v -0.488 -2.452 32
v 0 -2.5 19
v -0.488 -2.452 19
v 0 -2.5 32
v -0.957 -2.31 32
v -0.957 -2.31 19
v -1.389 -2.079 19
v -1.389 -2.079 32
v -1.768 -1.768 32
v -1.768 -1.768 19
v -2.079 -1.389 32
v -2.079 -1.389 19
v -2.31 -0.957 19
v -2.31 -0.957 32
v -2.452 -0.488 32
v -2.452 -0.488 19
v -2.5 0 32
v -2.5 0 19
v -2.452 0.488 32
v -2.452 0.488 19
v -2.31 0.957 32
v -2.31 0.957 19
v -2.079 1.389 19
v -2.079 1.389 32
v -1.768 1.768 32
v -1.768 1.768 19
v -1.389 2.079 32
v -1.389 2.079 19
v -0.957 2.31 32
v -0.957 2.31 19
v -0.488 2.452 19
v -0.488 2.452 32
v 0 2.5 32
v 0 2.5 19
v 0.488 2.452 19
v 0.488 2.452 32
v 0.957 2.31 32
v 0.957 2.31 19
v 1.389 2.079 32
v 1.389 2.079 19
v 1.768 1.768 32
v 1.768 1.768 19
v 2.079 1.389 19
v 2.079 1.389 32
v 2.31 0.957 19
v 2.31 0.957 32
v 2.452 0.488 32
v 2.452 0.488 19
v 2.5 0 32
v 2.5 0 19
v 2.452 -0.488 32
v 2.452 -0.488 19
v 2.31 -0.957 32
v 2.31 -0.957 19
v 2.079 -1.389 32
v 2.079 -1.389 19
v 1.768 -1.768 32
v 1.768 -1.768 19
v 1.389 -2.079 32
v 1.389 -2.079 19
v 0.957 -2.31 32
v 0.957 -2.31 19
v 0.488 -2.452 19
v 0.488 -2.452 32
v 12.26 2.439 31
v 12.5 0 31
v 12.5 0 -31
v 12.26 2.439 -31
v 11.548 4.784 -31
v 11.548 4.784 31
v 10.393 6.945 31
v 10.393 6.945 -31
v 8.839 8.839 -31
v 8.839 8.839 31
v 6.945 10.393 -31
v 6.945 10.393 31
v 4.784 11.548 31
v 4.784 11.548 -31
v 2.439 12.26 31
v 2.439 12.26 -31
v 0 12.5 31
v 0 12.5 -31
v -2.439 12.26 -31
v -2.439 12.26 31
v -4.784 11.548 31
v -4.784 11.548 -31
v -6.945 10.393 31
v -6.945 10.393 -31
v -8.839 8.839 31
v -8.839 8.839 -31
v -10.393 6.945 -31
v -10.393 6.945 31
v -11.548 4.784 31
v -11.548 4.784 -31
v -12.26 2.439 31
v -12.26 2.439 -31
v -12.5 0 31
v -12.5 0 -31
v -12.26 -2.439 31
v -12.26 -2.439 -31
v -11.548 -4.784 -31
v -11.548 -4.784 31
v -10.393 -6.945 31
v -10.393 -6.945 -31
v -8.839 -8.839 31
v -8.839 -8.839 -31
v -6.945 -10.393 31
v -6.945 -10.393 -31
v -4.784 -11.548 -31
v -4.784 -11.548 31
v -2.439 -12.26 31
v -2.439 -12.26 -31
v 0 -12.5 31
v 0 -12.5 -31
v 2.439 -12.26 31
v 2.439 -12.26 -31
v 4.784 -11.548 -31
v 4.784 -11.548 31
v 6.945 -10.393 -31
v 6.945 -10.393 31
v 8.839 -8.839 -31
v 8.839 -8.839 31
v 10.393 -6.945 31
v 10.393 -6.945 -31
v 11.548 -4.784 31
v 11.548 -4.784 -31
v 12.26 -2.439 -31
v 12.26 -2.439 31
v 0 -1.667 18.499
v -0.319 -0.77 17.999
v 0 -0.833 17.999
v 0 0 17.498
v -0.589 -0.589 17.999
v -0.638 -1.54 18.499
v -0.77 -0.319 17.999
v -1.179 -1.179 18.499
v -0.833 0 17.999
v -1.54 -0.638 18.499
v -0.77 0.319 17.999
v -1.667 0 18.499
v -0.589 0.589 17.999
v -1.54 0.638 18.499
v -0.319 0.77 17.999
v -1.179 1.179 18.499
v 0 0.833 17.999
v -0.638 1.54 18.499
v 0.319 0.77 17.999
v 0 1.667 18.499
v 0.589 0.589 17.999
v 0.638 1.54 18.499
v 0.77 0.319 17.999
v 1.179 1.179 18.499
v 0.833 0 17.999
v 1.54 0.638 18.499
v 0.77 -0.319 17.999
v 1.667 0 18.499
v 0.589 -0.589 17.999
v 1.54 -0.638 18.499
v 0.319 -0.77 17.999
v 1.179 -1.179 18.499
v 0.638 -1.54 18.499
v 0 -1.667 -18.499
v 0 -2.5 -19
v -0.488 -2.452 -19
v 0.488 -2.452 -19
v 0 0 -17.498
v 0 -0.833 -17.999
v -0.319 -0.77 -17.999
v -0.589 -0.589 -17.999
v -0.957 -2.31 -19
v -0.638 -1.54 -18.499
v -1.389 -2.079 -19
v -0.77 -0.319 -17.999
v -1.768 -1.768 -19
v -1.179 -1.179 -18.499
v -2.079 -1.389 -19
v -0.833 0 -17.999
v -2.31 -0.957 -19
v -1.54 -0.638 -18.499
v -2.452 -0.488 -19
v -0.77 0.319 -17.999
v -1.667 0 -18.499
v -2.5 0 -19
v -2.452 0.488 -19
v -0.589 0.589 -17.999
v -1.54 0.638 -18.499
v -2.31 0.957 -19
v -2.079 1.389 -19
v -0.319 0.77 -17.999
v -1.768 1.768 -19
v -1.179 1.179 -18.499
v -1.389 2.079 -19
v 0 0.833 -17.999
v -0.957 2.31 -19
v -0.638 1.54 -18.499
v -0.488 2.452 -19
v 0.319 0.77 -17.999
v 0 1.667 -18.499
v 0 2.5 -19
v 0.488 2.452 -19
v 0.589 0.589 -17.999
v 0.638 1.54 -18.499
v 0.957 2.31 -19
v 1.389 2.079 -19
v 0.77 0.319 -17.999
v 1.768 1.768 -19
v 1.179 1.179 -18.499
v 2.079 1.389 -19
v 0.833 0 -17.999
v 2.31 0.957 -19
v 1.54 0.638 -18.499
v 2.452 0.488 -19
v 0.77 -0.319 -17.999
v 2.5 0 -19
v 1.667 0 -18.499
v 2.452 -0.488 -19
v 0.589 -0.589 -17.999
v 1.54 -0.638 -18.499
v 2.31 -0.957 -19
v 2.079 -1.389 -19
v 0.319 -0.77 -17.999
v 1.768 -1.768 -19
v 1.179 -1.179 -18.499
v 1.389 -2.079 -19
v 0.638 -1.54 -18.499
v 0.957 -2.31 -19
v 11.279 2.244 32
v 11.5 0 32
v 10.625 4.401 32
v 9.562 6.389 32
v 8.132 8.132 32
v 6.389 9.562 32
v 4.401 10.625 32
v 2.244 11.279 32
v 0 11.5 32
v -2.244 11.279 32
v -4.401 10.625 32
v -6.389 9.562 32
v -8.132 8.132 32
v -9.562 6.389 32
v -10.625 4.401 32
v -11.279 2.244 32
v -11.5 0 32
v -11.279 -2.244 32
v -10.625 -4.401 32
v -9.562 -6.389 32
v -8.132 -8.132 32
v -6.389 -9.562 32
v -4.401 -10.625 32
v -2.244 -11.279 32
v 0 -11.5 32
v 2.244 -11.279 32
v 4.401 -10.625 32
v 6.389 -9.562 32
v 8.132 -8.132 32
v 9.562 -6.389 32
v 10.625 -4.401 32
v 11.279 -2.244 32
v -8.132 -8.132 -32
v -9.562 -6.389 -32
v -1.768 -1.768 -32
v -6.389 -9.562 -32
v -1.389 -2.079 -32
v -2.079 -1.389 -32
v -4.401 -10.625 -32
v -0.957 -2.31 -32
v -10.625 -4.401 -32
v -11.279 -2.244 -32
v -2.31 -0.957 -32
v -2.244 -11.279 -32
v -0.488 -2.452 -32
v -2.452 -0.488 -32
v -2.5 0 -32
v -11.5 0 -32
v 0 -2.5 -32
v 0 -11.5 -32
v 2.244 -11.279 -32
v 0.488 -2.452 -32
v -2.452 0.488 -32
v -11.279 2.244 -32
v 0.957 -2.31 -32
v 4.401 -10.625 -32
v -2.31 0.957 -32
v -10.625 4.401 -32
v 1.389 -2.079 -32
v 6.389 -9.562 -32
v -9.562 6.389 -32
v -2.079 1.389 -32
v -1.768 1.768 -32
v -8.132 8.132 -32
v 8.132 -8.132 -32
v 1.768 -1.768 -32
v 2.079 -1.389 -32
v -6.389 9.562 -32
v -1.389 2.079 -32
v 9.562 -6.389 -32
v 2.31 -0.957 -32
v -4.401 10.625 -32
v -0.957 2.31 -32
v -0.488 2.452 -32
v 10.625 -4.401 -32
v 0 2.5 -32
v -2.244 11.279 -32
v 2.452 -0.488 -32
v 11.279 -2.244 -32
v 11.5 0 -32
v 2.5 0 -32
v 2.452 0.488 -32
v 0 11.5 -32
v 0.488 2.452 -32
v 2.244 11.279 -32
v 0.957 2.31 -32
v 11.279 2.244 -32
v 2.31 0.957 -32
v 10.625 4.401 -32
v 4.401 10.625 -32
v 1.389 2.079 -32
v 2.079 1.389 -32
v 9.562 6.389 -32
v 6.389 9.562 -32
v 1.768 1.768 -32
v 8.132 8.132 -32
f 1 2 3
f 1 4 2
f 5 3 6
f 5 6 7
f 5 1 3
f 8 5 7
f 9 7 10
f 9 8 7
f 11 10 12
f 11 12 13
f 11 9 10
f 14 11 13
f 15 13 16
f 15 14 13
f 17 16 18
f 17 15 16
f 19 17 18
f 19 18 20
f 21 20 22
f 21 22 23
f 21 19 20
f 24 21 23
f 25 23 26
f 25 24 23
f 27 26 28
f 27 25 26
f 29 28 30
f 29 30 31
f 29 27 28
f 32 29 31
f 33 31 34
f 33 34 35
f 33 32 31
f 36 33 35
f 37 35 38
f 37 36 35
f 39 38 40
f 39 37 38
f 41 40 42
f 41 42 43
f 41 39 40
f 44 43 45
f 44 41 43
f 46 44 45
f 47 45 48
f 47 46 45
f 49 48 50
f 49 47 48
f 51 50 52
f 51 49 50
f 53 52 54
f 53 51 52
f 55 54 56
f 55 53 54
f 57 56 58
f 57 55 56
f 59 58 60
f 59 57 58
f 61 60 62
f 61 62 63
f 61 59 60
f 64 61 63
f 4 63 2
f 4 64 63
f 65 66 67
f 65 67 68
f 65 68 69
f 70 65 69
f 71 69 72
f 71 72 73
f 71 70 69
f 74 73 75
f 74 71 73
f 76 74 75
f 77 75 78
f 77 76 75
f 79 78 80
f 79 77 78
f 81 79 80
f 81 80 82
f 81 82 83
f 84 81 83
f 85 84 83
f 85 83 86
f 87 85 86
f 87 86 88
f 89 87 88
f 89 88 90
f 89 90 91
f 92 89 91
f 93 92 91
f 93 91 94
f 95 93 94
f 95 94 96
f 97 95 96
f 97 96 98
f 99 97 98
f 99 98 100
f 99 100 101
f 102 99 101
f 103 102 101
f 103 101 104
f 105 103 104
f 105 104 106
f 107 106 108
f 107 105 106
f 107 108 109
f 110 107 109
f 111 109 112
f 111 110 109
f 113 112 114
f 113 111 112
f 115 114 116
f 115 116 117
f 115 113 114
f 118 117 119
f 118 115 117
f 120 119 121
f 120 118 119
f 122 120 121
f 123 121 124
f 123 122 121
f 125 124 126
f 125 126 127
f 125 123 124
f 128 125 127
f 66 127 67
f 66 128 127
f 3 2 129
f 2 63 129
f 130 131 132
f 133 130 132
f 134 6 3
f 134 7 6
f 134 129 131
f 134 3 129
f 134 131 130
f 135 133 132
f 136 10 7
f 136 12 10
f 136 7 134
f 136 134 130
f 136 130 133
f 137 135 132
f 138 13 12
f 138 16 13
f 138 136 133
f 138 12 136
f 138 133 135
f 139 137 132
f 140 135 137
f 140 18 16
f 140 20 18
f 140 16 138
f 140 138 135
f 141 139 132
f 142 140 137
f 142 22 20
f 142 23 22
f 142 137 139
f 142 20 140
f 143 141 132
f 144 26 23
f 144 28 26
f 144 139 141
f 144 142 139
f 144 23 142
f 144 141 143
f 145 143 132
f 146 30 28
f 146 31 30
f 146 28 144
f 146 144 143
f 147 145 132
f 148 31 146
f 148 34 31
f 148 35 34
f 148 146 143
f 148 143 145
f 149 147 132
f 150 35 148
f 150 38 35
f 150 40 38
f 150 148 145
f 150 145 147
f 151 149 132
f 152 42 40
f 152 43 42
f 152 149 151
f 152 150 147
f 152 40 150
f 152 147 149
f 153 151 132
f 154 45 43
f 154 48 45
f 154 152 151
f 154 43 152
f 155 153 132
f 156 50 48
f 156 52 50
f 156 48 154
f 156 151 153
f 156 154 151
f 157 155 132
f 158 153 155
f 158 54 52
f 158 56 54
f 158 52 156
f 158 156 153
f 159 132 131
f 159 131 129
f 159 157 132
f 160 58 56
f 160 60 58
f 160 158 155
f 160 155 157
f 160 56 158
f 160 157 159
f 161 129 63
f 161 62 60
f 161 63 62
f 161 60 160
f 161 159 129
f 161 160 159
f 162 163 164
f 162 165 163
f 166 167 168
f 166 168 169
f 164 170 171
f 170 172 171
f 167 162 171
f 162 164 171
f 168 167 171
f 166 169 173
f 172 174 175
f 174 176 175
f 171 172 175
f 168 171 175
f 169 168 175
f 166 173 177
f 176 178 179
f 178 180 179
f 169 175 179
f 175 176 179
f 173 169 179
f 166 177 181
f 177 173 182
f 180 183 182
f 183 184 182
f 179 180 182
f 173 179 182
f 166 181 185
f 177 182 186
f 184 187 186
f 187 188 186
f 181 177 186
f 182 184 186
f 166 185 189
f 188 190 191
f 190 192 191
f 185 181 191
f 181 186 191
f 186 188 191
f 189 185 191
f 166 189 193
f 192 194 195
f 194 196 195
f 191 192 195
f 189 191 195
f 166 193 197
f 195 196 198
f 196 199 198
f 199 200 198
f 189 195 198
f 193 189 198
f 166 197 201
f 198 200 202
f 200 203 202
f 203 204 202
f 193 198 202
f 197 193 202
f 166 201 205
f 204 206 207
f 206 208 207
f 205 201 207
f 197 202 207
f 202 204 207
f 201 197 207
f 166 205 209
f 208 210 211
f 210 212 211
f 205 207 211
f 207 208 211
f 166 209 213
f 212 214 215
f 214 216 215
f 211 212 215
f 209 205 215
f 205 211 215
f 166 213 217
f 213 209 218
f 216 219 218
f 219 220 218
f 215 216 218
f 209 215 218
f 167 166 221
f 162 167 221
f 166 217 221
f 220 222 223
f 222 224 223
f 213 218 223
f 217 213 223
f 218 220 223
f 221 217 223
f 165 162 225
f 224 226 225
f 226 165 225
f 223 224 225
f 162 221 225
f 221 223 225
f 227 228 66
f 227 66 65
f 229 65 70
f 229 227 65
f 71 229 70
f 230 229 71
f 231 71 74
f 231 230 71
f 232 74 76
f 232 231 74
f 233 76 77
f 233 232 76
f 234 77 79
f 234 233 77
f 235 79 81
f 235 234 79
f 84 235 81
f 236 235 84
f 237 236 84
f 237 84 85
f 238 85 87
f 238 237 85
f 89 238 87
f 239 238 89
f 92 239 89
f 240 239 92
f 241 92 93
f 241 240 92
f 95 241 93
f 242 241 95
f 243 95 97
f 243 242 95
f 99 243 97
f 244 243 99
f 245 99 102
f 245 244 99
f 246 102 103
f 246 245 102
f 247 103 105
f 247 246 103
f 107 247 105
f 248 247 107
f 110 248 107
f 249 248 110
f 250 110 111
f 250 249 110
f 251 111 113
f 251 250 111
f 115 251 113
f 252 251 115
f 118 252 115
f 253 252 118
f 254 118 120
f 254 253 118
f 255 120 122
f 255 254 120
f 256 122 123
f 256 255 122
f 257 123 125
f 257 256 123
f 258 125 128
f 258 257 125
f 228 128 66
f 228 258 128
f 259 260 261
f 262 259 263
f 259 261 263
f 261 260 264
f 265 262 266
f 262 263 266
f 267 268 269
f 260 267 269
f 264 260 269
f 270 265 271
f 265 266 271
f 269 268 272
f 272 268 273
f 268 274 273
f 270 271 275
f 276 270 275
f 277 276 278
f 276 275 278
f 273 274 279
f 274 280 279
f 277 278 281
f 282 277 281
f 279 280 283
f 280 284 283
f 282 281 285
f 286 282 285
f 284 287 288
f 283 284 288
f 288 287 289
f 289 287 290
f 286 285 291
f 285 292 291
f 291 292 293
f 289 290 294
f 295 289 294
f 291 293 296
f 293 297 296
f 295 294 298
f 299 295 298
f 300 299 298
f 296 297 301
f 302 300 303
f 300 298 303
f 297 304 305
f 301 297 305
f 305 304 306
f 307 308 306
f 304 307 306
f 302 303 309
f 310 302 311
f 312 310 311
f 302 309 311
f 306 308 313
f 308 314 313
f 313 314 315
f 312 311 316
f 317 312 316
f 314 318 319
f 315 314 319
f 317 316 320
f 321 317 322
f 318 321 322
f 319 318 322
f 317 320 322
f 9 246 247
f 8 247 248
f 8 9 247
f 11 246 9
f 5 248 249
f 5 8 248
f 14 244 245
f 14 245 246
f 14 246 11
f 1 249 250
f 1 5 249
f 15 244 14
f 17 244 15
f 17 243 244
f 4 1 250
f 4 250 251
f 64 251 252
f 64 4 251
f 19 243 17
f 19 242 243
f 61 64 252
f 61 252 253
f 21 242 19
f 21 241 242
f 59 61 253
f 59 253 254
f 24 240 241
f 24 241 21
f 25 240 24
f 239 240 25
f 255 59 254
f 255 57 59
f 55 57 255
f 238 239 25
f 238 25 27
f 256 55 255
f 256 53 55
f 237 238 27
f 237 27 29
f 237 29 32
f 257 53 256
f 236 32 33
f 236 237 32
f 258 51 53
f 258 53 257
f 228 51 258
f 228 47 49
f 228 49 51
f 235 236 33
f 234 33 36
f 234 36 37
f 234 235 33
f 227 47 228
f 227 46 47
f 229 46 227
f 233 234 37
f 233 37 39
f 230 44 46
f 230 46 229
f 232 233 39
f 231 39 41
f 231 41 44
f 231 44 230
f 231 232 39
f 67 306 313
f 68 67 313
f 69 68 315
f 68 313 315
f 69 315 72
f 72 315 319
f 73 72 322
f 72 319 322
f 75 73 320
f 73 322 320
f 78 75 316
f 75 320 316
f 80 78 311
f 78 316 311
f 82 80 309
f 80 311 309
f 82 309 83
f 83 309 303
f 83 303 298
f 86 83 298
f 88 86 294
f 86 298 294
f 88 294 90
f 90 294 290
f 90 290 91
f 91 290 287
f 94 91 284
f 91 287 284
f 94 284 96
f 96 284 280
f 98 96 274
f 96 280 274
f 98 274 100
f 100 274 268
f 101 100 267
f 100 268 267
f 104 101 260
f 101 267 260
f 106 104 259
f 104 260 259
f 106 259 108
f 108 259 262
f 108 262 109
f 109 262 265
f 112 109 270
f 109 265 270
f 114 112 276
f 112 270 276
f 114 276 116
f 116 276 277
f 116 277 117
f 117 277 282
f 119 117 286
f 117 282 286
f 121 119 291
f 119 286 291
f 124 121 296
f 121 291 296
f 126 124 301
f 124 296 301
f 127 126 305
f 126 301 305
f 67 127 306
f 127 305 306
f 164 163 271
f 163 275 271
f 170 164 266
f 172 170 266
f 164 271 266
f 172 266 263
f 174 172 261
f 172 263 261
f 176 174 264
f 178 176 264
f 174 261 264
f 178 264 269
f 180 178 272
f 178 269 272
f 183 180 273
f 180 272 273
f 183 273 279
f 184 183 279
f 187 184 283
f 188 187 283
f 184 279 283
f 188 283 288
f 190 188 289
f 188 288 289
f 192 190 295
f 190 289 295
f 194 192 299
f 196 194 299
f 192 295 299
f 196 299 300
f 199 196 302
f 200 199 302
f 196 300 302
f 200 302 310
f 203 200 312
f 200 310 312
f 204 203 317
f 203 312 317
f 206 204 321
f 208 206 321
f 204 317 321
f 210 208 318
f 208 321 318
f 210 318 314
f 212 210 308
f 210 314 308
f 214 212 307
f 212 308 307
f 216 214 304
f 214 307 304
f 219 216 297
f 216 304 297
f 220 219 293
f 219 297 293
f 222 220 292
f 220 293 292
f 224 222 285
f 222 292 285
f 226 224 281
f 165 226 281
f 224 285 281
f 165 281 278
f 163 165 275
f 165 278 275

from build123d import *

# Parameters (mm, degrees)
SKETCH1_R           = 12.5
BOSS_EXTRUDE1_DEPTH = 32
CHAMFER1_SIZE       = 1


with BuildPart() as part:
    # Sketch1 → Boss-Extrude1 (new body, symmetric)
    with BuildSketch(Plane.XY):
        Circle(SKETCH1_R)
    extrude(amount=BOSS_EXTRUDE1_DEPTH, both=True)

    # Chamfer1
    chamfer1_edges = [part.edges().sort_by_distance(p)[0] for p in [
        (-12.5, 0, -32),
        (-12.5, 0, 32),
    ]]
    chamfer(chamfer1_edges, length=CHAMFER1_SIZE)

    # Sketch4 → Tap Drill for M6 Tap1 (revolve, cut)
    with BuildSketch(Plane(origin=(0, 0, 32), x_dir=(0, -1, 0), z_dir=(1, 0, 0))):
        Polygon((0, 0), (0, 14.502151548), (2.5, 13), (2.5, 0), align=None)
    tap_drill_for_m6_tap1 = revolve(axis=Axis((0, 0, 38.35), (0, 0, -1)), mode=Mode.SUBTRACT)

    # Mirror1: Tap Drill for M6 Tap1 across plane
    add(tap_drill_for_m6_tap1.mirror(Plane.XY), mode=Mode.SUBTRACT)


solid = part.part
